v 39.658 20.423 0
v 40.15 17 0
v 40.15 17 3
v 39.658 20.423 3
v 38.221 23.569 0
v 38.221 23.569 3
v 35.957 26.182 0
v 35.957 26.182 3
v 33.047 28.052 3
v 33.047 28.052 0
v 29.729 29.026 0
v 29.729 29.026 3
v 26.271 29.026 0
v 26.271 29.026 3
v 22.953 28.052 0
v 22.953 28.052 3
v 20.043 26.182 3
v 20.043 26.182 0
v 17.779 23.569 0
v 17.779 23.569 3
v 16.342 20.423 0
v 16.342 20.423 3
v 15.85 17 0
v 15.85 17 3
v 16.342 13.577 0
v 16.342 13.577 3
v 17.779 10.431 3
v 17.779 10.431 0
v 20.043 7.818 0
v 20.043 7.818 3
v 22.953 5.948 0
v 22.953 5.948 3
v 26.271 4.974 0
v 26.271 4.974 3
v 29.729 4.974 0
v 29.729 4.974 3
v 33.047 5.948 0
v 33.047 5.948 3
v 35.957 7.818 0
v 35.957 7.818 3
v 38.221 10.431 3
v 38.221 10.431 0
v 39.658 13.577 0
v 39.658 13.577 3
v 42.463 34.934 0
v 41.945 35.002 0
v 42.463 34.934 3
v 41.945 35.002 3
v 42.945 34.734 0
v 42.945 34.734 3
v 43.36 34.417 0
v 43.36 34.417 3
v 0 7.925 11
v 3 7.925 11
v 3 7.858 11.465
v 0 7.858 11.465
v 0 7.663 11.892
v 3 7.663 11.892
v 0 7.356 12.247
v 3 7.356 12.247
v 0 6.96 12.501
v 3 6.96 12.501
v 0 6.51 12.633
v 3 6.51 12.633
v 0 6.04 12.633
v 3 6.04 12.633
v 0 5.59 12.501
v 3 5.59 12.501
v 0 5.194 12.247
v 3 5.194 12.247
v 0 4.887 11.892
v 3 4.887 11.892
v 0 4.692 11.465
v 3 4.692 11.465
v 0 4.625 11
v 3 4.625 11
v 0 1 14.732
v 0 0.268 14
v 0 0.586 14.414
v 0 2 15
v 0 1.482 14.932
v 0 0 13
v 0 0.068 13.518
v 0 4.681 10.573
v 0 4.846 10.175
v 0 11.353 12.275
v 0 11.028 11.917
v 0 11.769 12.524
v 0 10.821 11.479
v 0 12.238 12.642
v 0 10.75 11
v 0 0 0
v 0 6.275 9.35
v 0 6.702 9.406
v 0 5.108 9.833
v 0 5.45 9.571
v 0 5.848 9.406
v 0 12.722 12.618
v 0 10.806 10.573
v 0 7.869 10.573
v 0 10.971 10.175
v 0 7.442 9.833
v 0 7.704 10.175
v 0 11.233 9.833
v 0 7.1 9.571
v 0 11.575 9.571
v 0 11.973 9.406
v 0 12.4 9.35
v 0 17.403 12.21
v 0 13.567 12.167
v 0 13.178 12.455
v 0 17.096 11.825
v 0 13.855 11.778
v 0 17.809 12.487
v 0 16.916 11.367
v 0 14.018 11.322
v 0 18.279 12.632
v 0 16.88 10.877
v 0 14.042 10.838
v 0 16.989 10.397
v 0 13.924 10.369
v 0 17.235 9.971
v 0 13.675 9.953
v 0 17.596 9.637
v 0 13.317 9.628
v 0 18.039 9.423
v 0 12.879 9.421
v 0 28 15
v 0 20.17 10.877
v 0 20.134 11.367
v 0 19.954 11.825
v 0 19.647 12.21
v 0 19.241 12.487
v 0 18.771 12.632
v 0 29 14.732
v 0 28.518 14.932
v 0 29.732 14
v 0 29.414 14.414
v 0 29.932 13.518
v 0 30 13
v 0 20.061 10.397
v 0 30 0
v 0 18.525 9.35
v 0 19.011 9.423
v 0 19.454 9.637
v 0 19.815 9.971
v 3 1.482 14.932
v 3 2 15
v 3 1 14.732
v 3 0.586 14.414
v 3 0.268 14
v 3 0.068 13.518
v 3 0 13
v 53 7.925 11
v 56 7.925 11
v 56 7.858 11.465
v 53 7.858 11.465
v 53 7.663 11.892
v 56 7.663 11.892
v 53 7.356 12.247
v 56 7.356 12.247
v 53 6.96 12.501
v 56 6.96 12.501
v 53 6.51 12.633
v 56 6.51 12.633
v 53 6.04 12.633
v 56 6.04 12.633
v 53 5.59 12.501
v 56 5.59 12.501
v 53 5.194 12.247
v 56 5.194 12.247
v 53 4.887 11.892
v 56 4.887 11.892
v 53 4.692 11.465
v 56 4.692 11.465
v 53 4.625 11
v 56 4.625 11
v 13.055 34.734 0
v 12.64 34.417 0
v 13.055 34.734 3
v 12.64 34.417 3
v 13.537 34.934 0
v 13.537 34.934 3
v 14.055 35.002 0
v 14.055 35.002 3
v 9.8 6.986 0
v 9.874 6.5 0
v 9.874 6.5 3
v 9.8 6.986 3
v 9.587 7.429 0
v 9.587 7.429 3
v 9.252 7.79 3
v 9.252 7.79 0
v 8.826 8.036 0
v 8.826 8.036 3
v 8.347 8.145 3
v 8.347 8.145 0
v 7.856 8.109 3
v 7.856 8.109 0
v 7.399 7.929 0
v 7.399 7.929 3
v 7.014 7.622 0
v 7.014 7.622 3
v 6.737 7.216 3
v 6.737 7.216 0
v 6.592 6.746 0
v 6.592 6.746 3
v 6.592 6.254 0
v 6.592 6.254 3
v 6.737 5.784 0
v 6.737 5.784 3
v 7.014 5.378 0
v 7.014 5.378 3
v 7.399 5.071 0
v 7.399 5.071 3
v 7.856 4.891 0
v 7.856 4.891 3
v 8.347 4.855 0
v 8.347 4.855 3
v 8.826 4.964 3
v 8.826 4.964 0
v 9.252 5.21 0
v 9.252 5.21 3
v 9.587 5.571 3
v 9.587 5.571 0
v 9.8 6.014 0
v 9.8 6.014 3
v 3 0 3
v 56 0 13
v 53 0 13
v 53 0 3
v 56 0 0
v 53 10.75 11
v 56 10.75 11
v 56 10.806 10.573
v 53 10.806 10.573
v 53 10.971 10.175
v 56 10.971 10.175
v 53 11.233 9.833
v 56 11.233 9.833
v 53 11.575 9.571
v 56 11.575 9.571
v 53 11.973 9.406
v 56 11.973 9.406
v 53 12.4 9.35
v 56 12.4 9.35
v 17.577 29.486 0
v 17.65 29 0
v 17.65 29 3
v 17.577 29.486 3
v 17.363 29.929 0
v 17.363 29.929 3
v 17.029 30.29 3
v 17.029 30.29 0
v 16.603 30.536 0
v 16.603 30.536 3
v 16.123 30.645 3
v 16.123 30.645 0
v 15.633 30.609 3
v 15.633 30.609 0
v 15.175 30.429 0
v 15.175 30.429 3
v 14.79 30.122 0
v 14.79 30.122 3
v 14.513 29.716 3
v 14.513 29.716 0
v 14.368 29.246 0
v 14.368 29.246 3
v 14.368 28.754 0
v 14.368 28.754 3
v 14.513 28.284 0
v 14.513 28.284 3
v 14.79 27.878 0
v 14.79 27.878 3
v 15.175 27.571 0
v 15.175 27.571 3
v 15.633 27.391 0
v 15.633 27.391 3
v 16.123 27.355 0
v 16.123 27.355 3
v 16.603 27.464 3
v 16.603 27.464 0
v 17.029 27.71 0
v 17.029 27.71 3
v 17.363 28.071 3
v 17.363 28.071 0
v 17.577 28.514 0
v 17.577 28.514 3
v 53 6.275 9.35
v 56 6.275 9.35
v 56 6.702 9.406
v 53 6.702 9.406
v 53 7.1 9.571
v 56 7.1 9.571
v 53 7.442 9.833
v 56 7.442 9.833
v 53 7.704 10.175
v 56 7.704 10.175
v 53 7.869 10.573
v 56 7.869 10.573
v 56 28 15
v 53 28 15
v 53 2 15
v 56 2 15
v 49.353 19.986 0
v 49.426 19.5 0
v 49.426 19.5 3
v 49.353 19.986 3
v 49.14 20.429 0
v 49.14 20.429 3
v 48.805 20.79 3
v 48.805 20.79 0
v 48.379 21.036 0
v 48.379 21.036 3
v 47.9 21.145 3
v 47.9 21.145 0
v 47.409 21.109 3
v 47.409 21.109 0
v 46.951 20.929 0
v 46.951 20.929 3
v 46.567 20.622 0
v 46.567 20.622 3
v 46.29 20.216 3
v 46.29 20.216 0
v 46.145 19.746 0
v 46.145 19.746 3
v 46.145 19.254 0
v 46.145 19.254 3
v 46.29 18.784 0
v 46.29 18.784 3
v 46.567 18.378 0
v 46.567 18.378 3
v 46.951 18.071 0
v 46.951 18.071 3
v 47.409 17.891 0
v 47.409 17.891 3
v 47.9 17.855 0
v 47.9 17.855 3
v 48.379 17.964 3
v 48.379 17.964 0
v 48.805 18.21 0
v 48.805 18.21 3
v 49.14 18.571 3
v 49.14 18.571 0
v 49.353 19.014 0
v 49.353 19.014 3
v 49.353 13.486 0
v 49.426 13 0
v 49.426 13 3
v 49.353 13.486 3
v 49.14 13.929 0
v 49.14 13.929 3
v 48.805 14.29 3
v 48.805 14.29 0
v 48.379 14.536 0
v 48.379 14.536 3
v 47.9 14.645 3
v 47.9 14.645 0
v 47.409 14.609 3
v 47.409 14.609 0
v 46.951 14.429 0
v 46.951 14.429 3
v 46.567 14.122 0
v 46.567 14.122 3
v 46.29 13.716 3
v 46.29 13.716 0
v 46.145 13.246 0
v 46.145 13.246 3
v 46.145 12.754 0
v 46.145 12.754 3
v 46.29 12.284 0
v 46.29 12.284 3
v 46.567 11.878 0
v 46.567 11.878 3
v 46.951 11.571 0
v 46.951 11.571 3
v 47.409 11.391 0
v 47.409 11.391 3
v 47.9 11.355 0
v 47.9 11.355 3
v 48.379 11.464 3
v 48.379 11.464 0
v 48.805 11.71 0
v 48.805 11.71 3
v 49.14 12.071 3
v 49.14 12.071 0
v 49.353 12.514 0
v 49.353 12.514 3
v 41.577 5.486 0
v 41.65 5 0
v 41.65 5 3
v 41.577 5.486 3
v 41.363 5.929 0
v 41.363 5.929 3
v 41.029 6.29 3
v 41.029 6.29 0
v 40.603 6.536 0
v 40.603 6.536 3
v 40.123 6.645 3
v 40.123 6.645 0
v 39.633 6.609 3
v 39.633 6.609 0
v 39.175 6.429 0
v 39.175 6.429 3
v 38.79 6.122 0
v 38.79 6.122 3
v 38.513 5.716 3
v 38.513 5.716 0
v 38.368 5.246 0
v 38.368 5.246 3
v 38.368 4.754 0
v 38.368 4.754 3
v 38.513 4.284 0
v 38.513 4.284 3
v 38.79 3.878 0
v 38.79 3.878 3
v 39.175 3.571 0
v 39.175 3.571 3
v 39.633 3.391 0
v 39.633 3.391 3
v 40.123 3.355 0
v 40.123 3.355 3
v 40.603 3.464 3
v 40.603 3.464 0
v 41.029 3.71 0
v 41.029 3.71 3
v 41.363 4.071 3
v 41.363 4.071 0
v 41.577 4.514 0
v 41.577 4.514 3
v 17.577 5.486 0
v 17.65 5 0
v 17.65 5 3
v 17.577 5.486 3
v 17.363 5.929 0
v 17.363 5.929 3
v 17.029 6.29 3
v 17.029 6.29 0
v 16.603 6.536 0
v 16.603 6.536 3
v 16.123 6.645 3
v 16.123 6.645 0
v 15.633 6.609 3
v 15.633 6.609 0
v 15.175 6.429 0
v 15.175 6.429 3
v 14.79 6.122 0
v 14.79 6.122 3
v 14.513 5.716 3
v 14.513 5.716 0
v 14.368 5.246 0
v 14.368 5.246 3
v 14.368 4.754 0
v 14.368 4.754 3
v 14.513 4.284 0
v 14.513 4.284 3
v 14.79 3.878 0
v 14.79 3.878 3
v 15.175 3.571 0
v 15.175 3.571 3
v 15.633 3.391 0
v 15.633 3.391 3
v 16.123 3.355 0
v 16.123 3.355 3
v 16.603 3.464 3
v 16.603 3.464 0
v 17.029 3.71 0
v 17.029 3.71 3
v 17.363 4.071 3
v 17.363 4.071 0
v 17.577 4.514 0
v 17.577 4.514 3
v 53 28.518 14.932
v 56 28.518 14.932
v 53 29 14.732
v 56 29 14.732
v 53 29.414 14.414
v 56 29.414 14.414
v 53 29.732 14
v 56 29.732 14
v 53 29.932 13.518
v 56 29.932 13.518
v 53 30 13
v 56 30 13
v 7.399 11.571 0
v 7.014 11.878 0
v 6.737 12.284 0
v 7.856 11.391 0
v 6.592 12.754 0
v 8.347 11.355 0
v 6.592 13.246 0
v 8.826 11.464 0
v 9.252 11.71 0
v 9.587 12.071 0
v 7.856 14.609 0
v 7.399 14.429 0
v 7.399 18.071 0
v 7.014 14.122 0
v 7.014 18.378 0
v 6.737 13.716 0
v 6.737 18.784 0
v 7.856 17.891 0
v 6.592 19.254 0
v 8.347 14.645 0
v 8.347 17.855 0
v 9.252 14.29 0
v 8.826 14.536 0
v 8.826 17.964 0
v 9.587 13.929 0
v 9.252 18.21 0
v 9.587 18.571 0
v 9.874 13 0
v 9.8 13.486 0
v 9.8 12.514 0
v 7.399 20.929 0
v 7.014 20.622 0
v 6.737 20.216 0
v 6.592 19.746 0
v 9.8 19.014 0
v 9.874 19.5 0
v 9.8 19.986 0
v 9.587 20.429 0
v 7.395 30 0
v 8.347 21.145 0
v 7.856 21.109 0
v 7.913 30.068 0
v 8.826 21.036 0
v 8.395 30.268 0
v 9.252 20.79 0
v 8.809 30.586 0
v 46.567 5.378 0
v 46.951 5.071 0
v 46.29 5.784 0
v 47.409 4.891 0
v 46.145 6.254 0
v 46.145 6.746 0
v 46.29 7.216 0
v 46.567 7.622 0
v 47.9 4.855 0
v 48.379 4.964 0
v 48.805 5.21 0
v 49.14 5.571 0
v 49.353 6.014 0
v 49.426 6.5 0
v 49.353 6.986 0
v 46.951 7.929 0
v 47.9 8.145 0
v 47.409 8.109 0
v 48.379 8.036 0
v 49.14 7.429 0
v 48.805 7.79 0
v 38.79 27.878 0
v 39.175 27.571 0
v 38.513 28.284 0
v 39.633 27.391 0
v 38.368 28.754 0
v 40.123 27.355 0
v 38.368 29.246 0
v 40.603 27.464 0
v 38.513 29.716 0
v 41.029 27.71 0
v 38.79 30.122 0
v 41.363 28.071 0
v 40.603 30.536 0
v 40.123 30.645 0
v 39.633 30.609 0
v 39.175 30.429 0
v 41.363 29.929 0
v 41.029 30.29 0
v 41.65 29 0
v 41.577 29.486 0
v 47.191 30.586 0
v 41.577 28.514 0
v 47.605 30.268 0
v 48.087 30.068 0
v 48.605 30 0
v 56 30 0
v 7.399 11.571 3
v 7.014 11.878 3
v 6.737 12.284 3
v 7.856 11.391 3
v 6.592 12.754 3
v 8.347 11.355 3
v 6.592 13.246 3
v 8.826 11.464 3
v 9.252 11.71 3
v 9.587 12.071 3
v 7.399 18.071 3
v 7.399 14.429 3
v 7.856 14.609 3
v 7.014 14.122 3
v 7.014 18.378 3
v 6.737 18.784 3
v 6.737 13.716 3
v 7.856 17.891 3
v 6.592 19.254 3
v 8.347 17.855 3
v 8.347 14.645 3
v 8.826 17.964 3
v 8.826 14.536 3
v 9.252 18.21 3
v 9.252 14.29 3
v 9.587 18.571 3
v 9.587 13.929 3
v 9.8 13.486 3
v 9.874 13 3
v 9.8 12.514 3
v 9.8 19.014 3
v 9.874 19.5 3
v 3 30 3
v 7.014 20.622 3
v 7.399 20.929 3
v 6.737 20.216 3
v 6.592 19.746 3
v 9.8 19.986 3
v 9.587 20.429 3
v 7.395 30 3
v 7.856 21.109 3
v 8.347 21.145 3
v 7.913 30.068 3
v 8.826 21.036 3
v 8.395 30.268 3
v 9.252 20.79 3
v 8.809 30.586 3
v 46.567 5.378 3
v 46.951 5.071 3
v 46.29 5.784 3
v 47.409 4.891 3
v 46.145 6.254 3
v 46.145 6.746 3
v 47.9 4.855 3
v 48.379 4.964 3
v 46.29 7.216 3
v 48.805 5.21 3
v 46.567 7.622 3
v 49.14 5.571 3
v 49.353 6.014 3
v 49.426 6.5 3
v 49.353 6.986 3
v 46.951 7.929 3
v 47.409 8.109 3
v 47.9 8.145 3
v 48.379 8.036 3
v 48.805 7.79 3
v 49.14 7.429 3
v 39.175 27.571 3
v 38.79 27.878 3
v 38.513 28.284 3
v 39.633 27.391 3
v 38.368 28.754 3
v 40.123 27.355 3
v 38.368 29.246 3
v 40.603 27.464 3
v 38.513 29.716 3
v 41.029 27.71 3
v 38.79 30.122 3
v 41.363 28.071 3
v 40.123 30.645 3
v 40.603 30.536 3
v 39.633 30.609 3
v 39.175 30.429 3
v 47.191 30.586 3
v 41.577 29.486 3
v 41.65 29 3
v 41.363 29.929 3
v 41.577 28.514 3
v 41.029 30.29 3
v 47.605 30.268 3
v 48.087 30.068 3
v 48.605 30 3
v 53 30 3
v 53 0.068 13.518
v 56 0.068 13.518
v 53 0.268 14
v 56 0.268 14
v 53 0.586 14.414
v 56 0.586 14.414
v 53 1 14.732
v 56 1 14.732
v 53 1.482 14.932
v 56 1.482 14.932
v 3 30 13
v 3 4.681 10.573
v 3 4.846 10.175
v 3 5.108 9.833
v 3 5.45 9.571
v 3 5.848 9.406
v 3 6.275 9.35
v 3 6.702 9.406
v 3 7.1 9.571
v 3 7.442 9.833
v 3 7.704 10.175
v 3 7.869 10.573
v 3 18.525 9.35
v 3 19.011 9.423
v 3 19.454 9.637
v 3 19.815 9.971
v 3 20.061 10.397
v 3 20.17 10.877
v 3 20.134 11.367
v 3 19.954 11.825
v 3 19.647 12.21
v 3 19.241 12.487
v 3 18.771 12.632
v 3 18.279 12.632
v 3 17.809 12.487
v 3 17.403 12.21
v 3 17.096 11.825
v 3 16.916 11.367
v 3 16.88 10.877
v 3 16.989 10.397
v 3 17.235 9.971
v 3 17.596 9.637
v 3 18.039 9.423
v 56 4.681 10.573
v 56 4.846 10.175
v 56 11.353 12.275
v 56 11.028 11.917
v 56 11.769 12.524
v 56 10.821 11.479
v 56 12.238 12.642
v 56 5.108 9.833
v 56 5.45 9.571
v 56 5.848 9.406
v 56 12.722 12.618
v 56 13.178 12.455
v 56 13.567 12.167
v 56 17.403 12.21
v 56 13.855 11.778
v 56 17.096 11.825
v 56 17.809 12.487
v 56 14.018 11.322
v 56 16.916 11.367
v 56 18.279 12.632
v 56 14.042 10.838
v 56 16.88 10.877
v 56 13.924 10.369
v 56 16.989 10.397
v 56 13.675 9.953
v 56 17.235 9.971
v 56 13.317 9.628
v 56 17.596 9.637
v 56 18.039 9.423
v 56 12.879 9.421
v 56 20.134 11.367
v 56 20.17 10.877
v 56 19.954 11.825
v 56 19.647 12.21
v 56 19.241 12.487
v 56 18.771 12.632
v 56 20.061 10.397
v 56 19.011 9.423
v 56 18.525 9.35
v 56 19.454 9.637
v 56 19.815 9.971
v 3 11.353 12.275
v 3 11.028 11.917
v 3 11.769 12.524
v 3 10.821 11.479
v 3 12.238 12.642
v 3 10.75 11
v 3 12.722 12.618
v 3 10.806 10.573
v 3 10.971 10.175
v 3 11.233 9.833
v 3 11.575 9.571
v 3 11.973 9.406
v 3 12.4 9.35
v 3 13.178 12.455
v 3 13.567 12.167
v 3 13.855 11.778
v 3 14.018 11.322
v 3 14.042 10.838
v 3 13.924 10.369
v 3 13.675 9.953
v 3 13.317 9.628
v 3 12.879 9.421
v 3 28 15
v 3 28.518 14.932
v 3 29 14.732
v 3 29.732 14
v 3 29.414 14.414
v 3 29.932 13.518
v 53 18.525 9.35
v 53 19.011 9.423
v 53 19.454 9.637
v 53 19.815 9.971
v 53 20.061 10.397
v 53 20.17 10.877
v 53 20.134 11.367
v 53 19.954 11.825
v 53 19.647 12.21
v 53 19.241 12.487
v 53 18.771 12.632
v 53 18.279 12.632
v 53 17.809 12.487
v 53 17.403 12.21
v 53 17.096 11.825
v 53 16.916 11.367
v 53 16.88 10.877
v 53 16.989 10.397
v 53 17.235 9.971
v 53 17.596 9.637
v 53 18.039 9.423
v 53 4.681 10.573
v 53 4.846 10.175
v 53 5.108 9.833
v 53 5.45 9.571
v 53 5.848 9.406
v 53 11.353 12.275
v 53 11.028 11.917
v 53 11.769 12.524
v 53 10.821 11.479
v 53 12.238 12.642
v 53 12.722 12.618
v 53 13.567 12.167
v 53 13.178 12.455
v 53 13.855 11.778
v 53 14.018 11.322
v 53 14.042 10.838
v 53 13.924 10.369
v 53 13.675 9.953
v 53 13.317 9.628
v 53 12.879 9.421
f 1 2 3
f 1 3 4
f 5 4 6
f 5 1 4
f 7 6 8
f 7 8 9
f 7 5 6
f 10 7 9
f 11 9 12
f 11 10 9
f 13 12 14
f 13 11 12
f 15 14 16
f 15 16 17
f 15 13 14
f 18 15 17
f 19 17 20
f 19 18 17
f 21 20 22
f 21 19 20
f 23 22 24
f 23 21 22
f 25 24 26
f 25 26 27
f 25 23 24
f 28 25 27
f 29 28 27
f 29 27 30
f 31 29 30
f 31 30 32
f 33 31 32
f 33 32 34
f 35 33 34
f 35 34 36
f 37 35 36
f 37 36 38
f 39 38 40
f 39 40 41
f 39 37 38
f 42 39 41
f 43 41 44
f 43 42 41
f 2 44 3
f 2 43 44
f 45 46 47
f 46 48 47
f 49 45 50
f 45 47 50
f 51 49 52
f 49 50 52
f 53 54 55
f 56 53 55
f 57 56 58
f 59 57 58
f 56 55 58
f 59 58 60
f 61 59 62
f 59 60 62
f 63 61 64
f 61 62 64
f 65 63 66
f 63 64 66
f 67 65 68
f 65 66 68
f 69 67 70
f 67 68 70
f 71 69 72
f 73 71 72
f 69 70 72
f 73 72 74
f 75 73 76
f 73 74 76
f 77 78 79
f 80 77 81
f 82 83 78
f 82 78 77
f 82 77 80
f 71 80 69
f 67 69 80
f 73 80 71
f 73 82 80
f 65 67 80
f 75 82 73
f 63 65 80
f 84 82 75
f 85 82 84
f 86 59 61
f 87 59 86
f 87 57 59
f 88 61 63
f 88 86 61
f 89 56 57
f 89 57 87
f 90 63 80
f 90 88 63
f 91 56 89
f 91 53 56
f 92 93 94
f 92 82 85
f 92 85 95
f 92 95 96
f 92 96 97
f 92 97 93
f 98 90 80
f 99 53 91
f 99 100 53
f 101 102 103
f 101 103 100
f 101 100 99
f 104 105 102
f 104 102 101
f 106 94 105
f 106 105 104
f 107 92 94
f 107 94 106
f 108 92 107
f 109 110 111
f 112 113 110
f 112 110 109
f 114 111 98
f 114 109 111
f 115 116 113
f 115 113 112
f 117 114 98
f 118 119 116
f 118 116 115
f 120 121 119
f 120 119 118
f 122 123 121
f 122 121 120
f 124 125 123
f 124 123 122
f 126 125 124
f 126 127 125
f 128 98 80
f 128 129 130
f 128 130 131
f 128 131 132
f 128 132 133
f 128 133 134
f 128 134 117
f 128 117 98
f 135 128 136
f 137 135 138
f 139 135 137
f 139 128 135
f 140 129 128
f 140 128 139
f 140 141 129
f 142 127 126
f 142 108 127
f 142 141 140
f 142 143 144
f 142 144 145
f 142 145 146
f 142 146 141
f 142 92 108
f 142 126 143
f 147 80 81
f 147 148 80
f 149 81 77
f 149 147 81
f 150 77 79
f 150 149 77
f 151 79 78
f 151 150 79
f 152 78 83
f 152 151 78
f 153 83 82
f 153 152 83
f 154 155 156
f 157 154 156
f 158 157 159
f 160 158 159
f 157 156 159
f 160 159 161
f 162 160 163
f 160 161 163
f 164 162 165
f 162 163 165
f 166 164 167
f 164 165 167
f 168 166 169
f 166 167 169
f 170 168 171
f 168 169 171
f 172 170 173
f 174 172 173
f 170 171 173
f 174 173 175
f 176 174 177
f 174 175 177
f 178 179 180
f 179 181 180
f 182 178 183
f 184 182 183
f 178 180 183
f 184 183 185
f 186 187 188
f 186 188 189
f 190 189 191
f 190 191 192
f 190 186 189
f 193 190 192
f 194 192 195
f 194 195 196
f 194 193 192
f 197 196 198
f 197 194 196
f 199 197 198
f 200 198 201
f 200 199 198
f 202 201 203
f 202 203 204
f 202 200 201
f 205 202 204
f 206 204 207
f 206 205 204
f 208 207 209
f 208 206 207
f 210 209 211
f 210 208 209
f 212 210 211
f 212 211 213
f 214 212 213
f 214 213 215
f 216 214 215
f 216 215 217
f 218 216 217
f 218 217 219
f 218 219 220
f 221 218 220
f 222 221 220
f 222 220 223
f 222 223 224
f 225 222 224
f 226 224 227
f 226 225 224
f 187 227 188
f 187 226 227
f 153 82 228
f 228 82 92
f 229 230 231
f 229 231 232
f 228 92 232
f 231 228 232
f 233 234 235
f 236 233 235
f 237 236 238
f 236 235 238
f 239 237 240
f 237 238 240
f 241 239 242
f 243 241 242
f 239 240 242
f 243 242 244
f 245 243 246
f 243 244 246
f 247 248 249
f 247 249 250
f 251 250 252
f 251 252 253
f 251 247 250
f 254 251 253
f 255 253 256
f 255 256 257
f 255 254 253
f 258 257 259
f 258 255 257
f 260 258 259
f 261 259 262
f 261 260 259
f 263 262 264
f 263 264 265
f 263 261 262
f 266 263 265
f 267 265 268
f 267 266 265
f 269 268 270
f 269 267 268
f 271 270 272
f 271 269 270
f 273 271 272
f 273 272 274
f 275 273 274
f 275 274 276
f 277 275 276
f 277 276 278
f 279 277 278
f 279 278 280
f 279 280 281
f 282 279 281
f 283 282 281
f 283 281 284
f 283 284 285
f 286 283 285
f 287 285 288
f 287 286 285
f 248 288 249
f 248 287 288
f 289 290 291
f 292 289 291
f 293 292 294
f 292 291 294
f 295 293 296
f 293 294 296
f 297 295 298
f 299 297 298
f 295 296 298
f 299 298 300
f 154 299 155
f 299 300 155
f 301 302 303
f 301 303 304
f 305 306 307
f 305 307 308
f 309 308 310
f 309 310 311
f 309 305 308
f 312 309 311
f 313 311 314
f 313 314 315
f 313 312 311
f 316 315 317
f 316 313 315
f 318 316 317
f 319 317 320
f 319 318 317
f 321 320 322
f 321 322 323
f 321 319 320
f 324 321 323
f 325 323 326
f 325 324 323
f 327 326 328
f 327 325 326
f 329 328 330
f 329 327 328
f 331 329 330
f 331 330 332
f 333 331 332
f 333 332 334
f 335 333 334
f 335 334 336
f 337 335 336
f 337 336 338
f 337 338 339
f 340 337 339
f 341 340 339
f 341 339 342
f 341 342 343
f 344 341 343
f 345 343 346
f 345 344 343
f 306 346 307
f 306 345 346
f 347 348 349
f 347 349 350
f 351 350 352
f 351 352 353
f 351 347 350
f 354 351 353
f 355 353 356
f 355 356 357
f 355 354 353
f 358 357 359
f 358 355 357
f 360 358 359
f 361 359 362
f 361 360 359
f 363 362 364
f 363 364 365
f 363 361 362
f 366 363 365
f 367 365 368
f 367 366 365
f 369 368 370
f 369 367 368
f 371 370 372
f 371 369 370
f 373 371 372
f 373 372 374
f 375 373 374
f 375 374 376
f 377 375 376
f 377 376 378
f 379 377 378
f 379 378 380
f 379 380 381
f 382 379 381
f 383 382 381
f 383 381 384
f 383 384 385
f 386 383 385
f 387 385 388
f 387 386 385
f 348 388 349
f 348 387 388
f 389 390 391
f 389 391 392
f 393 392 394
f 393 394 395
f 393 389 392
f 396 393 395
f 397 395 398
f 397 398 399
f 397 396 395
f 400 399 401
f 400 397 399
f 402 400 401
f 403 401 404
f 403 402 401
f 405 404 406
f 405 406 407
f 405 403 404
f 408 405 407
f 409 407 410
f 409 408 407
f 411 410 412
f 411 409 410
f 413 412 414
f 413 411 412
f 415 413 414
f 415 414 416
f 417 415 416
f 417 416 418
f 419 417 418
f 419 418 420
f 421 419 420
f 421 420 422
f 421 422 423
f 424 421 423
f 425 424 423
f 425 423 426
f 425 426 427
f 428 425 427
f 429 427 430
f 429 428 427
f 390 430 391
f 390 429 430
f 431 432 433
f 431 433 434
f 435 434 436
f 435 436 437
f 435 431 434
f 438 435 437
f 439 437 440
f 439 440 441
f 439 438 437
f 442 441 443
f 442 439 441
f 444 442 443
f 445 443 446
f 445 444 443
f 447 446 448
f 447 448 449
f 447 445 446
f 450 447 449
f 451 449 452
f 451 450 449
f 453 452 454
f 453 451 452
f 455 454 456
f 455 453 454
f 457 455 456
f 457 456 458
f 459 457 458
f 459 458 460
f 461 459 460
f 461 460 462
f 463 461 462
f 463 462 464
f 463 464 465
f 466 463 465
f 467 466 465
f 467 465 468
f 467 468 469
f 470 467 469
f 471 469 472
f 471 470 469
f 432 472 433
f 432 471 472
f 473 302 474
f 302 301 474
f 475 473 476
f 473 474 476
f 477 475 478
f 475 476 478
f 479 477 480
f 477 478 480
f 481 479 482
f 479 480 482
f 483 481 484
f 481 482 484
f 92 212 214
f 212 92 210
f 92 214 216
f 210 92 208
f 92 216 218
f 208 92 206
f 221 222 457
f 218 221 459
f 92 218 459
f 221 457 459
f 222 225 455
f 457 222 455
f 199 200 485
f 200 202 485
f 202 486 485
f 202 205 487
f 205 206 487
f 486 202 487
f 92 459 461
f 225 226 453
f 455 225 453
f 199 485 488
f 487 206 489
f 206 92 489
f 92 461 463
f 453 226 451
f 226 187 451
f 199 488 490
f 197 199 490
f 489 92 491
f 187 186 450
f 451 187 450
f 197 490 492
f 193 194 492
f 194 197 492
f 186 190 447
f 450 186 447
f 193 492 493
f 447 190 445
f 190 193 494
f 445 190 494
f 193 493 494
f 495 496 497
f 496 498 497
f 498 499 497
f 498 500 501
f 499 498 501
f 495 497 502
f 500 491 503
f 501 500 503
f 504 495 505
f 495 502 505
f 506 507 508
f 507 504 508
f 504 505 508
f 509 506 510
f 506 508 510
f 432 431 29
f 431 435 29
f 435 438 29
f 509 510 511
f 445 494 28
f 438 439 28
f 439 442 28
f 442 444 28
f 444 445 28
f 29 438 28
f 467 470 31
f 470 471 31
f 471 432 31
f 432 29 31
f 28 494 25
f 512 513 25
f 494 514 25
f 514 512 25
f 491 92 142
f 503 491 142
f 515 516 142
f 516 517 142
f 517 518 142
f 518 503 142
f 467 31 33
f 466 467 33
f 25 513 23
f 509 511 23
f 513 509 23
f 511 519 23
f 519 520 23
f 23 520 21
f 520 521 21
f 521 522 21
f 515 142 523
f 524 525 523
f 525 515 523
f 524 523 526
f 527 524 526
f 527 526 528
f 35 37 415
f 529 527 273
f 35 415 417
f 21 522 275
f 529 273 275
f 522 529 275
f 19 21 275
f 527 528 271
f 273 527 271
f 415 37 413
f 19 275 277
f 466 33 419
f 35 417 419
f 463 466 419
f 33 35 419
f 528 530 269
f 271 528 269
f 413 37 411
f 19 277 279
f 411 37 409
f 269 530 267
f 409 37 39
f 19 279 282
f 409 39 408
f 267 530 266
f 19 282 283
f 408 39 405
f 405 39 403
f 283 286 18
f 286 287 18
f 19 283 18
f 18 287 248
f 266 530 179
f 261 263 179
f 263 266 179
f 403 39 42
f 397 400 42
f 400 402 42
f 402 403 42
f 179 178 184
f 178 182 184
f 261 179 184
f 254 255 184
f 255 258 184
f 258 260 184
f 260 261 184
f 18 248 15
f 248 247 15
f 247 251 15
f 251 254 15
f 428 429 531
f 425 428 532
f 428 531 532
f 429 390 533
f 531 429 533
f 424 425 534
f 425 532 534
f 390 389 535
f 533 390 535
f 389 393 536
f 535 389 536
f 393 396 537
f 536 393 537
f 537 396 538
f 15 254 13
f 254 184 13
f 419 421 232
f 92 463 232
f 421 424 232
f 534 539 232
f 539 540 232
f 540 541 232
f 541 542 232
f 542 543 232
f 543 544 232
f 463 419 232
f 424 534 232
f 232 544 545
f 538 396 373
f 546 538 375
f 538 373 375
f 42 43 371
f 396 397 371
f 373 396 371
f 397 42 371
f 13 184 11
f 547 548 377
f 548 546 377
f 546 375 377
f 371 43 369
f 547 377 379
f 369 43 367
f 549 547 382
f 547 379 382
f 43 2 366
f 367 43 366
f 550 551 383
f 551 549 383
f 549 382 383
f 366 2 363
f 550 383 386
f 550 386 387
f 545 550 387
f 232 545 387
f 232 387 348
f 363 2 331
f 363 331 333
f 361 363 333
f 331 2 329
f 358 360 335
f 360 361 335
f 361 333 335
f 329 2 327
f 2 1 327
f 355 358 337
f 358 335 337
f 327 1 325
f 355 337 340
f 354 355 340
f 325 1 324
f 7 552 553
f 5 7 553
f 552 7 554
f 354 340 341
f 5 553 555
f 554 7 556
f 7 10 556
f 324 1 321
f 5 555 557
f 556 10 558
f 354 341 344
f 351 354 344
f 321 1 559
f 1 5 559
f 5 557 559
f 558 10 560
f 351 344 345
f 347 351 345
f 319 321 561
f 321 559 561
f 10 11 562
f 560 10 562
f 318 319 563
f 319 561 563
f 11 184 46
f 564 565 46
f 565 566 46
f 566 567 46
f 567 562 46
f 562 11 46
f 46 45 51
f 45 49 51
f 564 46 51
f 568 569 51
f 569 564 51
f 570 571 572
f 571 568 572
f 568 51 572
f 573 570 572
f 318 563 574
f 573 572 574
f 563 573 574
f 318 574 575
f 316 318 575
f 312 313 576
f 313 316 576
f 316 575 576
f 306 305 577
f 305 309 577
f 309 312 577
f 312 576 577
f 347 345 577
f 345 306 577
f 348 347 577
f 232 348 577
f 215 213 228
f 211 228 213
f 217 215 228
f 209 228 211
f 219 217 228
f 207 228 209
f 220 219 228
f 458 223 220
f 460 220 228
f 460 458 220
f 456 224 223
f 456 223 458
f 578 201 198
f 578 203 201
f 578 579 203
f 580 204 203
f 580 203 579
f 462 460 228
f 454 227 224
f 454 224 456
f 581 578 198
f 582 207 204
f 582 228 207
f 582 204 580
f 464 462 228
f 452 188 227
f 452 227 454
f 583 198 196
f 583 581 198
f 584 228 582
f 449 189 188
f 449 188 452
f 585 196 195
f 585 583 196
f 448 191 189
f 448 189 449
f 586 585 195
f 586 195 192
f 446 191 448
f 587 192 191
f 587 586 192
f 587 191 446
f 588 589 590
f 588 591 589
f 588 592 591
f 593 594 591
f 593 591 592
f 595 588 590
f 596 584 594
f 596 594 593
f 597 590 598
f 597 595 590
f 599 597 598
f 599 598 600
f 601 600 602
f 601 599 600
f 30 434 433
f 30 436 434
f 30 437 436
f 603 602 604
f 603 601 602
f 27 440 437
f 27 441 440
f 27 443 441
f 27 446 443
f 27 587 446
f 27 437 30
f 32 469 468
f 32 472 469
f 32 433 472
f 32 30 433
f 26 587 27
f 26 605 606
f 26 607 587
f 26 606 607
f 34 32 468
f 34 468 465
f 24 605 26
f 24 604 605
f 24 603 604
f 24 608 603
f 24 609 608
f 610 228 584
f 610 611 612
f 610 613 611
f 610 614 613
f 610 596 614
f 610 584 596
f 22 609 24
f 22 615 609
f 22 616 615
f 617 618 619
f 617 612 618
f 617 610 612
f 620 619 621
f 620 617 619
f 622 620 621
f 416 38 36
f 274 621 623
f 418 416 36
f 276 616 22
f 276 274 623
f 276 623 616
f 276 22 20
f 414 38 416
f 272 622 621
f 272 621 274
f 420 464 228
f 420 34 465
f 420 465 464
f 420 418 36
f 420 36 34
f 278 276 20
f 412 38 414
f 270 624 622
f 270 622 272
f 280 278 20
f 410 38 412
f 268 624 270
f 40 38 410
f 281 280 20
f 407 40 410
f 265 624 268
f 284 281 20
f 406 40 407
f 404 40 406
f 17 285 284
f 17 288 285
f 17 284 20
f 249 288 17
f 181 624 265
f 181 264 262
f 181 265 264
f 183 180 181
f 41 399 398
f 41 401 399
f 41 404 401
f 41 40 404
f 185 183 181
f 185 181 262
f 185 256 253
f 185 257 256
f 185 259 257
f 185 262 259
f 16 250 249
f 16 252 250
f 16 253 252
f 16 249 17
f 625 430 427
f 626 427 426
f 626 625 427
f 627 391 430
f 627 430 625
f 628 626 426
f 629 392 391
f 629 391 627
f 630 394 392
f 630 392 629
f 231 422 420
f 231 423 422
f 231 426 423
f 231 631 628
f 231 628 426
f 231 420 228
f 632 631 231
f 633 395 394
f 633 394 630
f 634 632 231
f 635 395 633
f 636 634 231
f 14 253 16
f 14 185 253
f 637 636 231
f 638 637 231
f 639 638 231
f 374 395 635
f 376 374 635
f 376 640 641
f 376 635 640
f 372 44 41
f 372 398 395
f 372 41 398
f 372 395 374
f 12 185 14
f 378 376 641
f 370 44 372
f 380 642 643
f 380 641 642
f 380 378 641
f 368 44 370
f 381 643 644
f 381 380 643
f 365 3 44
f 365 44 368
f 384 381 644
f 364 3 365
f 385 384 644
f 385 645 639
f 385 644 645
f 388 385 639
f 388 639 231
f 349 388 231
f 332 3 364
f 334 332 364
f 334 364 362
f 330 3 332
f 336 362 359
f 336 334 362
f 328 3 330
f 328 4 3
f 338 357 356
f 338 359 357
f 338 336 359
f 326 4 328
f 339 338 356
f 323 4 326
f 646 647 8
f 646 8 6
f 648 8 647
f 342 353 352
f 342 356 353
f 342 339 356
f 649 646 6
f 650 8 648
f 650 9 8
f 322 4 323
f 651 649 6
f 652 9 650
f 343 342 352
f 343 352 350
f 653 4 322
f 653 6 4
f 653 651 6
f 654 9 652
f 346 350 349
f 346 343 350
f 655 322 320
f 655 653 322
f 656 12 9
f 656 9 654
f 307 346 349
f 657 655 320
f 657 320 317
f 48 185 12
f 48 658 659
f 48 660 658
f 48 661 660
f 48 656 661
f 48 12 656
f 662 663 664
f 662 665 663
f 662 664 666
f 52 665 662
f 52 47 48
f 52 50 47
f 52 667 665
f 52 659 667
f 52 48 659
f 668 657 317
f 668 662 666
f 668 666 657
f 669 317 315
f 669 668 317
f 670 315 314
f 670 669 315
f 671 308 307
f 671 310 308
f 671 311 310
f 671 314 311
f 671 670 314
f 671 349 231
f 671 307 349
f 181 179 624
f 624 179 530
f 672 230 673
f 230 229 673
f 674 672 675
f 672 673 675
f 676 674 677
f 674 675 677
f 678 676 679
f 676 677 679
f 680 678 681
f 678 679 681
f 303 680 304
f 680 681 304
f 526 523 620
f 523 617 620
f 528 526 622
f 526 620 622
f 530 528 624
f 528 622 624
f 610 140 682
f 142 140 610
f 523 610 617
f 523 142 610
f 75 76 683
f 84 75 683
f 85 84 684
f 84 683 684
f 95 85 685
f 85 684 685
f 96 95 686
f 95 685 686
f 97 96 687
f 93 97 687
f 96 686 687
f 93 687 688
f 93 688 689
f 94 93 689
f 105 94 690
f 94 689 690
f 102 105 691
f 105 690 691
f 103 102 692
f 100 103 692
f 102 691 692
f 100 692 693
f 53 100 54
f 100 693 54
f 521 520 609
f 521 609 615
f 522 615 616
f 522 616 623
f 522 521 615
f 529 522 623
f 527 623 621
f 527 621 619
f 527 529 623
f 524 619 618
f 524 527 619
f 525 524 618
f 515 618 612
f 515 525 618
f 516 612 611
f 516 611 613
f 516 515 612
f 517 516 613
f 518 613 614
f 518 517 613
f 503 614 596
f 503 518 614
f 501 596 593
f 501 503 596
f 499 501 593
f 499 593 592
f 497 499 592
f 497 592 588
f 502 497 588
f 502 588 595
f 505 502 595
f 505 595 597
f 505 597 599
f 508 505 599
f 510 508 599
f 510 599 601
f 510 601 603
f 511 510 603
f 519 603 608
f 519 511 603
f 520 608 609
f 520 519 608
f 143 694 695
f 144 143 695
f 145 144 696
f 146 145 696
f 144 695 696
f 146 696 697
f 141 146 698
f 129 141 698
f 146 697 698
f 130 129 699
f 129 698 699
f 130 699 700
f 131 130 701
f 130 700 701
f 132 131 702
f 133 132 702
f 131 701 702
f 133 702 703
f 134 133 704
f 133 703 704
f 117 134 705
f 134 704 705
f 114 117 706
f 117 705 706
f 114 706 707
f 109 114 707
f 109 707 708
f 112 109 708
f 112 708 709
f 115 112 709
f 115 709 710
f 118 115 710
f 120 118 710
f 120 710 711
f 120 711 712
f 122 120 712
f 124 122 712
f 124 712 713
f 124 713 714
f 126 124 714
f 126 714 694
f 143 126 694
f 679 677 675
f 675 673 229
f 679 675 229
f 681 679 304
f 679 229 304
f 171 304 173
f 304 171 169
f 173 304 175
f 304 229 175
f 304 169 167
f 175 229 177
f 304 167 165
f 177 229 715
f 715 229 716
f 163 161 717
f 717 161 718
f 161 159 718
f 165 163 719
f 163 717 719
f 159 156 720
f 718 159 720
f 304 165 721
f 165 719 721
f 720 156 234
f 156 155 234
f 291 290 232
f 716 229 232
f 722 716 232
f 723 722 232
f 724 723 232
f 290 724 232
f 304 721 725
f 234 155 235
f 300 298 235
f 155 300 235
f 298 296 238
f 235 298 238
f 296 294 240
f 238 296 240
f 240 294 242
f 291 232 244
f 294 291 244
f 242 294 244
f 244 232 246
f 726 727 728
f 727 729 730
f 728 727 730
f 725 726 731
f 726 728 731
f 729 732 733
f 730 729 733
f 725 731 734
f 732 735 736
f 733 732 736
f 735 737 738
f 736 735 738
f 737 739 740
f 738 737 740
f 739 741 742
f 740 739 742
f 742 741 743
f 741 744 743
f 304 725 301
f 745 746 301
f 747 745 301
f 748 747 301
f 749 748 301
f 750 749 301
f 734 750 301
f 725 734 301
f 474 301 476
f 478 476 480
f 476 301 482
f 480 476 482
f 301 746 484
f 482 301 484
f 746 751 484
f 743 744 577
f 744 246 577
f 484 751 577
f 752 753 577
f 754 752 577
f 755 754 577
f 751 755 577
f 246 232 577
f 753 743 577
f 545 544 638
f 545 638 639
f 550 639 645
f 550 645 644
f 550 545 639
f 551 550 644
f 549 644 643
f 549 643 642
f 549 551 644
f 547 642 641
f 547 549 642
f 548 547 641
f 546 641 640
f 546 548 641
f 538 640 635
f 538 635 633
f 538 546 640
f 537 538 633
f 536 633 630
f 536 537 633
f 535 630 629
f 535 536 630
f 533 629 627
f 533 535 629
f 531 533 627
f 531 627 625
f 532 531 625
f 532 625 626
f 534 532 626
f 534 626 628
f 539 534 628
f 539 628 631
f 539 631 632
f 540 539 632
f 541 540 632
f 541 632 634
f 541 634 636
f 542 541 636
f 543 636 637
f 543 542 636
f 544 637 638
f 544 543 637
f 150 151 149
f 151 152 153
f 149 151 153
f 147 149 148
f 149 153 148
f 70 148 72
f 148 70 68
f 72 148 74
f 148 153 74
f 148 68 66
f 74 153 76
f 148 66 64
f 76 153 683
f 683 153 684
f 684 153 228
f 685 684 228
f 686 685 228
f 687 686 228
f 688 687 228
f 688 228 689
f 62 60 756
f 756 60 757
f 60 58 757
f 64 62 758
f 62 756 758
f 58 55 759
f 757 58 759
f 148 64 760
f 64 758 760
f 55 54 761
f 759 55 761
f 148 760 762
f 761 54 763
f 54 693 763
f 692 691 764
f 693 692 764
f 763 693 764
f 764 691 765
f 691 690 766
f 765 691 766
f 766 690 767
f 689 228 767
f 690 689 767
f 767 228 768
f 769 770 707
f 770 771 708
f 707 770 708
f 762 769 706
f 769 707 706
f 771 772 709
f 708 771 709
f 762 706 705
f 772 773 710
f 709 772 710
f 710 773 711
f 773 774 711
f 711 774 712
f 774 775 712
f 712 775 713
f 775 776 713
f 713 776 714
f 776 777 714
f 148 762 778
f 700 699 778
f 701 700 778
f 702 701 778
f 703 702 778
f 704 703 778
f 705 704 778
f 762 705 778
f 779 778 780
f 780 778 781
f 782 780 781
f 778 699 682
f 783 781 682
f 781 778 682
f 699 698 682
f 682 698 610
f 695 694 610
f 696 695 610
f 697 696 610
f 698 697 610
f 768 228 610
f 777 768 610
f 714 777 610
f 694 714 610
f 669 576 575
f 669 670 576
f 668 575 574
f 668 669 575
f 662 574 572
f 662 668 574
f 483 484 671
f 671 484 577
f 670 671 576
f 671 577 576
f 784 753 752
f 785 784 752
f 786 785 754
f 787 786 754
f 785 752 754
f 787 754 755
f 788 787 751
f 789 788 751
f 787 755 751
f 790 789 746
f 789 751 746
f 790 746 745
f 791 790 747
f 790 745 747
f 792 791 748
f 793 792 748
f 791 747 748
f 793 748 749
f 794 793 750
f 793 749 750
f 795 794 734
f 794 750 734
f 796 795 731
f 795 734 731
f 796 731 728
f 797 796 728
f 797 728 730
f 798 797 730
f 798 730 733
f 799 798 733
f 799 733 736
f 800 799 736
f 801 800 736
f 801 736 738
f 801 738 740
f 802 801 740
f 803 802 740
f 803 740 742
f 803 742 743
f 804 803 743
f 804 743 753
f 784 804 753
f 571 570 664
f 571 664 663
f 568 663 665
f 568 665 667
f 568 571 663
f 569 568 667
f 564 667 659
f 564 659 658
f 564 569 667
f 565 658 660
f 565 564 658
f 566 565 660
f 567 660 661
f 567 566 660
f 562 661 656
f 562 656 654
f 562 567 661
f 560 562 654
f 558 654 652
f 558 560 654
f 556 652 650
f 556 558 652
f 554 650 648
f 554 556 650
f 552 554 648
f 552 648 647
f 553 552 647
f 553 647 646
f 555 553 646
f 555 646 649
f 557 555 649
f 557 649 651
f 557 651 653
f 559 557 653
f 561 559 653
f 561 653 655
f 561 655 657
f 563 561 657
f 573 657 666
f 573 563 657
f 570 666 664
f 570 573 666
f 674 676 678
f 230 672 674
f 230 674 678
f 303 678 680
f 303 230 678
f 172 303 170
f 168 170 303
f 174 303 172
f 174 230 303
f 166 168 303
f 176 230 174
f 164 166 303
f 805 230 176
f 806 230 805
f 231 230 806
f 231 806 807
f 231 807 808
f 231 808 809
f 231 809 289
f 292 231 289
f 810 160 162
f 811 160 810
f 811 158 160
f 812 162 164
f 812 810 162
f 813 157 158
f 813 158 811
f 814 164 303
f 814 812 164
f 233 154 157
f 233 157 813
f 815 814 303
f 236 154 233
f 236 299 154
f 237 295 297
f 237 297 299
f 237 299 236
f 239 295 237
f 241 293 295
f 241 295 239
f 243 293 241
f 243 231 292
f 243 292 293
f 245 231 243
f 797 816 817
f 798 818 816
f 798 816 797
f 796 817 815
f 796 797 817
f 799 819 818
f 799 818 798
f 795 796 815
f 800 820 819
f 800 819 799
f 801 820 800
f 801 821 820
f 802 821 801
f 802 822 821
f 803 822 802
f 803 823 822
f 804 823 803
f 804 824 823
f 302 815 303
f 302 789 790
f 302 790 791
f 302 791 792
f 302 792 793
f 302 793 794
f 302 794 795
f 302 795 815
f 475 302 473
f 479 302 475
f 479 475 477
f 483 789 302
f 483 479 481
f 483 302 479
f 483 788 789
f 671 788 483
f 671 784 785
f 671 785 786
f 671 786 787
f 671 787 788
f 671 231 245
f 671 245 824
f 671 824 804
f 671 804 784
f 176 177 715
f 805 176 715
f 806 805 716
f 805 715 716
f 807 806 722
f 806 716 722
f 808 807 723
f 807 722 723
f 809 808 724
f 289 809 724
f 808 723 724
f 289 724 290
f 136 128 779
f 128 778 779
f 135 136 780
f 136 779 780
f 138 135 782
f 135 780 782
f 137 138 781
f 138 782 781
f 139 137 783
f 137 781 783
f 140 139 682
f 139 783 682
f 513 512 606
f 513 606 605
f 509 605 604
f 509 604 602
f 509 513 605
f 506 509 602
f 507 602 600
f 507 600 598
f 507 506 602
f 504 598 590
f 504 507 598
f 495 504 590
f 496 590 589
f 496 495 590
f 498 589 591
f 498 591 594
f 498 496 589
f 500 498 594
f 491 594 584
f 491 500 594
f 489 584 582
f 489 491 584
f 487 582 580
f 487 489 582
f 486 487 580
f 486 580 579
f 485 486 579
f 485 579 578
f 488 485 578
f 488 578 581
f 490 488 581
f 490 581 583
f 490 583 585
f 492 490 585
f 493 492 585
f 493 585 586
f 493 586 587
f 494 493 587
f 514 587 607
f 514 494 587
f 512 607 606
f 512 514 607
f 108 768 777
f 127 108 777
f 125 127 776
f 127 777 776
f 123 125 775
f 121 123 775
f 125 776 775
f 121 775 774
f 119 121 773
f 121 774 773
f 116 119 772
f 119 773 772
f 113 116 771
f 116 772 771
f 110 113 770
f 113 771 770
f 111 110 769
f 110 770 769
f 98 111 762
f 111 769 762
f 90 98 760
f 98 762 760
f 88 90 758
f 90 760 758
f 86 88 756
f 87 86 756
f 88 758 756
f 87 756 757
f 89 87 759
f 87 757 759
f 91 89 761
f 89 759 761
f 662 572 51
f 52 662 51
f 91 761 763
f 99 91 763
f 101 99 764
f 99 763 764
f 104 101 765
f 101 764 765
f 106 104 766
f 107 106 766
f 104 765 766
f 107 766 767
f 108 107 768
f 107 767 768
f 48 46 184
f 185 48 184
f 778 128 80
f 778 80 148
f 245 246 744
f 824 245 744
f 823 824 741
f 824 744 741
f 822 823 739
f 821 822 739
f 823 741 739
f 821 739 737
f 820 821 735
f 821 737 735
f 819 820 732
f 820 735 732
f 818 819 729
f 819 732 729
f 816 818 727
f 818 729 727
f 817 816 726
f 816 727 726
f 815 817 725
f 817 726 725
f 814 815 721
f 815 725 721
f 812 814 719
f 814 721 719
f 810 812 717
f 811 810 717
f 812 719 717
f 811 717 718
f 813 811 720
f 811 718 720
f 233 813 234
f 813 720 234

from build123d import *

# Parameters (mm, degrees)
SKETCH_1_R          = 1.65
SKETCH_1_R_2        = 12.15
EXTRUDE_6_DEPTH     = 3
SKETCH_4_W          = 3
SKETCH_4_H          = 30
EXTRUDE_7_DEPTH     = 12
SKETCH_5_R          = 1.65
CUT_EXTRUDE_1_DEPTH = 56
FILLET_6_R          = 2


with BuildPart() as part:
    # 草图1 → 凸台-拉伸6 (new body)
    with BuildSketch(Plane.XY):
        Polygon((0, 30), (0, 0), (56, 0), (56, 30), (47.77634117, 30), (42.77391153, 35.00242964), (13.226088475, 35.00242964), (8.223658835, 30), align=None)
        with Locations((16, 29)):
            Circle(SKETCH_1_R, mode=Mode.SUBTRACT)
        with Locations((40, 29)):
            Circle(SKETCH_1_R, mode=Mode.SUBTRACT)
        with Locations((8.223658835, 6.5)):
            Circle(SKETCH_1_R, mode=Mode.SUBTRACT)
        with Locations((16, 5)):
            Circle(SKETCH_1_R, mode=Mode.SUBTRACT)
        with Locations((8.223658835, 13)):
            Circle(SKETCH_1_R, mode=Mode.SUBTRACT)
        with Locations((40, 5)):
            Circle(SKETCH_1_R, mode=Mode.SUBTRACT)
        with Locations((47.77634117, 6.5)):
            Circle(SKETCH_1_R, mode=Mode.SUBTRACT)
        with Locations((28, 17)):
            Circle(SKETCH_1_R_2, mode=Mode.SUBTRACT)
        with Locations((47.77634117, 13)):
            Circle(SKETCH_1_R, mode=Mode.SUBTRACT)
        with Locations((8.223658835, 19.5)):
            Circle(SKETCH_1_R, mode=Mode.SUBTRACT)
        with Locations((47.77634117, 19.5)):
            Circle(SKETCH_1_R, mode=Mode.SUBTRACT)
    extrude(amount=EXTRUDE_6_DEPTH)

    # 草图4 → 凸台-拉伸7 (add)
    with BuildSketch(Plane.XY.offset(3)):
        with Locations((1.5, 15)):
            Rectangle(SKETCH_4_W, SKETCH_4_H)
        with Locations((54.5, 15)):
            Rectangle(SKETCH_4_W, SKETCH_4_H)
    extrude(amount=EXTRUDE_7_DEPTH)

    # 草图5 → 切除-拉伸1 (cut)
    with BuildSketch(Plane(origin=(56, 0, 0), x_dir=(0, 0, -1), z_dir=(1, 0, 0))):
        with Locations((-11, 18.525)):
            Circle(SKETCH_5_R)
        with BuildLine():
            ThreePointArc((-9.35, 12.4), (-12.166726189, 13.566726189), (-11, 10.75))
            Line((-11, 10.75), (-11, 12.4))
            Line((-11, 12.4), (-9.35, 12.4))
        make_face()
        with BuildLine():
            Line((-11, 12.4), (-11, 10.75))
            ThreePointArc((-11, 10.75), (-9.833273811, 11.233273811), (-9.35, 12.4))
            Line((-9.35, 12.4), (-11, 12.4))
        make_face()
        with BuildLine():
            ThreePointArc((-11, 7.925), (-12.65, 6.275), (-11, 4.625))
            Line((-11, 4.625), (-11, 6.275))
            Line((-11, 6.275), (-11, 7.925))
        make_face()
        with BuildLine():
            Line((-11, 6.275), (-11, 4.625))
            ThreePointArc((-11, 4.625), (-9.833273811, 5.108273811), (-9.35, 6.275))
            ThreePointArc((-9.35, 6.275), (-9.833273811, 7.441726189), (-11, 7.925))
            Line((-11, 7.925), (-11, 6.275))
        make_face()
    extrude(amount=-CUT_EXTRUDE_1_DEPTH, mode=Mode.SUBTRACT)

    # 圆角6
    fillet_6_edges = [part.edges().sort_by_distance(p)[0] for p in [
        (8.223658835, 30, 1.5),
        (13.226088475, 35.00242964, 1.5),
        (42.77391153, 35.00242964, 1.5),
        (47.77634117, 30, 1.5),
        (1.5, 30, 15),
        (1.5, 0, 15),
        (54.5, 30, 15),
        (54.5, 0, 15),
    ]]
    fillet(fillet_6_edges, radius=FILLET_6_R)


solid = part.part
